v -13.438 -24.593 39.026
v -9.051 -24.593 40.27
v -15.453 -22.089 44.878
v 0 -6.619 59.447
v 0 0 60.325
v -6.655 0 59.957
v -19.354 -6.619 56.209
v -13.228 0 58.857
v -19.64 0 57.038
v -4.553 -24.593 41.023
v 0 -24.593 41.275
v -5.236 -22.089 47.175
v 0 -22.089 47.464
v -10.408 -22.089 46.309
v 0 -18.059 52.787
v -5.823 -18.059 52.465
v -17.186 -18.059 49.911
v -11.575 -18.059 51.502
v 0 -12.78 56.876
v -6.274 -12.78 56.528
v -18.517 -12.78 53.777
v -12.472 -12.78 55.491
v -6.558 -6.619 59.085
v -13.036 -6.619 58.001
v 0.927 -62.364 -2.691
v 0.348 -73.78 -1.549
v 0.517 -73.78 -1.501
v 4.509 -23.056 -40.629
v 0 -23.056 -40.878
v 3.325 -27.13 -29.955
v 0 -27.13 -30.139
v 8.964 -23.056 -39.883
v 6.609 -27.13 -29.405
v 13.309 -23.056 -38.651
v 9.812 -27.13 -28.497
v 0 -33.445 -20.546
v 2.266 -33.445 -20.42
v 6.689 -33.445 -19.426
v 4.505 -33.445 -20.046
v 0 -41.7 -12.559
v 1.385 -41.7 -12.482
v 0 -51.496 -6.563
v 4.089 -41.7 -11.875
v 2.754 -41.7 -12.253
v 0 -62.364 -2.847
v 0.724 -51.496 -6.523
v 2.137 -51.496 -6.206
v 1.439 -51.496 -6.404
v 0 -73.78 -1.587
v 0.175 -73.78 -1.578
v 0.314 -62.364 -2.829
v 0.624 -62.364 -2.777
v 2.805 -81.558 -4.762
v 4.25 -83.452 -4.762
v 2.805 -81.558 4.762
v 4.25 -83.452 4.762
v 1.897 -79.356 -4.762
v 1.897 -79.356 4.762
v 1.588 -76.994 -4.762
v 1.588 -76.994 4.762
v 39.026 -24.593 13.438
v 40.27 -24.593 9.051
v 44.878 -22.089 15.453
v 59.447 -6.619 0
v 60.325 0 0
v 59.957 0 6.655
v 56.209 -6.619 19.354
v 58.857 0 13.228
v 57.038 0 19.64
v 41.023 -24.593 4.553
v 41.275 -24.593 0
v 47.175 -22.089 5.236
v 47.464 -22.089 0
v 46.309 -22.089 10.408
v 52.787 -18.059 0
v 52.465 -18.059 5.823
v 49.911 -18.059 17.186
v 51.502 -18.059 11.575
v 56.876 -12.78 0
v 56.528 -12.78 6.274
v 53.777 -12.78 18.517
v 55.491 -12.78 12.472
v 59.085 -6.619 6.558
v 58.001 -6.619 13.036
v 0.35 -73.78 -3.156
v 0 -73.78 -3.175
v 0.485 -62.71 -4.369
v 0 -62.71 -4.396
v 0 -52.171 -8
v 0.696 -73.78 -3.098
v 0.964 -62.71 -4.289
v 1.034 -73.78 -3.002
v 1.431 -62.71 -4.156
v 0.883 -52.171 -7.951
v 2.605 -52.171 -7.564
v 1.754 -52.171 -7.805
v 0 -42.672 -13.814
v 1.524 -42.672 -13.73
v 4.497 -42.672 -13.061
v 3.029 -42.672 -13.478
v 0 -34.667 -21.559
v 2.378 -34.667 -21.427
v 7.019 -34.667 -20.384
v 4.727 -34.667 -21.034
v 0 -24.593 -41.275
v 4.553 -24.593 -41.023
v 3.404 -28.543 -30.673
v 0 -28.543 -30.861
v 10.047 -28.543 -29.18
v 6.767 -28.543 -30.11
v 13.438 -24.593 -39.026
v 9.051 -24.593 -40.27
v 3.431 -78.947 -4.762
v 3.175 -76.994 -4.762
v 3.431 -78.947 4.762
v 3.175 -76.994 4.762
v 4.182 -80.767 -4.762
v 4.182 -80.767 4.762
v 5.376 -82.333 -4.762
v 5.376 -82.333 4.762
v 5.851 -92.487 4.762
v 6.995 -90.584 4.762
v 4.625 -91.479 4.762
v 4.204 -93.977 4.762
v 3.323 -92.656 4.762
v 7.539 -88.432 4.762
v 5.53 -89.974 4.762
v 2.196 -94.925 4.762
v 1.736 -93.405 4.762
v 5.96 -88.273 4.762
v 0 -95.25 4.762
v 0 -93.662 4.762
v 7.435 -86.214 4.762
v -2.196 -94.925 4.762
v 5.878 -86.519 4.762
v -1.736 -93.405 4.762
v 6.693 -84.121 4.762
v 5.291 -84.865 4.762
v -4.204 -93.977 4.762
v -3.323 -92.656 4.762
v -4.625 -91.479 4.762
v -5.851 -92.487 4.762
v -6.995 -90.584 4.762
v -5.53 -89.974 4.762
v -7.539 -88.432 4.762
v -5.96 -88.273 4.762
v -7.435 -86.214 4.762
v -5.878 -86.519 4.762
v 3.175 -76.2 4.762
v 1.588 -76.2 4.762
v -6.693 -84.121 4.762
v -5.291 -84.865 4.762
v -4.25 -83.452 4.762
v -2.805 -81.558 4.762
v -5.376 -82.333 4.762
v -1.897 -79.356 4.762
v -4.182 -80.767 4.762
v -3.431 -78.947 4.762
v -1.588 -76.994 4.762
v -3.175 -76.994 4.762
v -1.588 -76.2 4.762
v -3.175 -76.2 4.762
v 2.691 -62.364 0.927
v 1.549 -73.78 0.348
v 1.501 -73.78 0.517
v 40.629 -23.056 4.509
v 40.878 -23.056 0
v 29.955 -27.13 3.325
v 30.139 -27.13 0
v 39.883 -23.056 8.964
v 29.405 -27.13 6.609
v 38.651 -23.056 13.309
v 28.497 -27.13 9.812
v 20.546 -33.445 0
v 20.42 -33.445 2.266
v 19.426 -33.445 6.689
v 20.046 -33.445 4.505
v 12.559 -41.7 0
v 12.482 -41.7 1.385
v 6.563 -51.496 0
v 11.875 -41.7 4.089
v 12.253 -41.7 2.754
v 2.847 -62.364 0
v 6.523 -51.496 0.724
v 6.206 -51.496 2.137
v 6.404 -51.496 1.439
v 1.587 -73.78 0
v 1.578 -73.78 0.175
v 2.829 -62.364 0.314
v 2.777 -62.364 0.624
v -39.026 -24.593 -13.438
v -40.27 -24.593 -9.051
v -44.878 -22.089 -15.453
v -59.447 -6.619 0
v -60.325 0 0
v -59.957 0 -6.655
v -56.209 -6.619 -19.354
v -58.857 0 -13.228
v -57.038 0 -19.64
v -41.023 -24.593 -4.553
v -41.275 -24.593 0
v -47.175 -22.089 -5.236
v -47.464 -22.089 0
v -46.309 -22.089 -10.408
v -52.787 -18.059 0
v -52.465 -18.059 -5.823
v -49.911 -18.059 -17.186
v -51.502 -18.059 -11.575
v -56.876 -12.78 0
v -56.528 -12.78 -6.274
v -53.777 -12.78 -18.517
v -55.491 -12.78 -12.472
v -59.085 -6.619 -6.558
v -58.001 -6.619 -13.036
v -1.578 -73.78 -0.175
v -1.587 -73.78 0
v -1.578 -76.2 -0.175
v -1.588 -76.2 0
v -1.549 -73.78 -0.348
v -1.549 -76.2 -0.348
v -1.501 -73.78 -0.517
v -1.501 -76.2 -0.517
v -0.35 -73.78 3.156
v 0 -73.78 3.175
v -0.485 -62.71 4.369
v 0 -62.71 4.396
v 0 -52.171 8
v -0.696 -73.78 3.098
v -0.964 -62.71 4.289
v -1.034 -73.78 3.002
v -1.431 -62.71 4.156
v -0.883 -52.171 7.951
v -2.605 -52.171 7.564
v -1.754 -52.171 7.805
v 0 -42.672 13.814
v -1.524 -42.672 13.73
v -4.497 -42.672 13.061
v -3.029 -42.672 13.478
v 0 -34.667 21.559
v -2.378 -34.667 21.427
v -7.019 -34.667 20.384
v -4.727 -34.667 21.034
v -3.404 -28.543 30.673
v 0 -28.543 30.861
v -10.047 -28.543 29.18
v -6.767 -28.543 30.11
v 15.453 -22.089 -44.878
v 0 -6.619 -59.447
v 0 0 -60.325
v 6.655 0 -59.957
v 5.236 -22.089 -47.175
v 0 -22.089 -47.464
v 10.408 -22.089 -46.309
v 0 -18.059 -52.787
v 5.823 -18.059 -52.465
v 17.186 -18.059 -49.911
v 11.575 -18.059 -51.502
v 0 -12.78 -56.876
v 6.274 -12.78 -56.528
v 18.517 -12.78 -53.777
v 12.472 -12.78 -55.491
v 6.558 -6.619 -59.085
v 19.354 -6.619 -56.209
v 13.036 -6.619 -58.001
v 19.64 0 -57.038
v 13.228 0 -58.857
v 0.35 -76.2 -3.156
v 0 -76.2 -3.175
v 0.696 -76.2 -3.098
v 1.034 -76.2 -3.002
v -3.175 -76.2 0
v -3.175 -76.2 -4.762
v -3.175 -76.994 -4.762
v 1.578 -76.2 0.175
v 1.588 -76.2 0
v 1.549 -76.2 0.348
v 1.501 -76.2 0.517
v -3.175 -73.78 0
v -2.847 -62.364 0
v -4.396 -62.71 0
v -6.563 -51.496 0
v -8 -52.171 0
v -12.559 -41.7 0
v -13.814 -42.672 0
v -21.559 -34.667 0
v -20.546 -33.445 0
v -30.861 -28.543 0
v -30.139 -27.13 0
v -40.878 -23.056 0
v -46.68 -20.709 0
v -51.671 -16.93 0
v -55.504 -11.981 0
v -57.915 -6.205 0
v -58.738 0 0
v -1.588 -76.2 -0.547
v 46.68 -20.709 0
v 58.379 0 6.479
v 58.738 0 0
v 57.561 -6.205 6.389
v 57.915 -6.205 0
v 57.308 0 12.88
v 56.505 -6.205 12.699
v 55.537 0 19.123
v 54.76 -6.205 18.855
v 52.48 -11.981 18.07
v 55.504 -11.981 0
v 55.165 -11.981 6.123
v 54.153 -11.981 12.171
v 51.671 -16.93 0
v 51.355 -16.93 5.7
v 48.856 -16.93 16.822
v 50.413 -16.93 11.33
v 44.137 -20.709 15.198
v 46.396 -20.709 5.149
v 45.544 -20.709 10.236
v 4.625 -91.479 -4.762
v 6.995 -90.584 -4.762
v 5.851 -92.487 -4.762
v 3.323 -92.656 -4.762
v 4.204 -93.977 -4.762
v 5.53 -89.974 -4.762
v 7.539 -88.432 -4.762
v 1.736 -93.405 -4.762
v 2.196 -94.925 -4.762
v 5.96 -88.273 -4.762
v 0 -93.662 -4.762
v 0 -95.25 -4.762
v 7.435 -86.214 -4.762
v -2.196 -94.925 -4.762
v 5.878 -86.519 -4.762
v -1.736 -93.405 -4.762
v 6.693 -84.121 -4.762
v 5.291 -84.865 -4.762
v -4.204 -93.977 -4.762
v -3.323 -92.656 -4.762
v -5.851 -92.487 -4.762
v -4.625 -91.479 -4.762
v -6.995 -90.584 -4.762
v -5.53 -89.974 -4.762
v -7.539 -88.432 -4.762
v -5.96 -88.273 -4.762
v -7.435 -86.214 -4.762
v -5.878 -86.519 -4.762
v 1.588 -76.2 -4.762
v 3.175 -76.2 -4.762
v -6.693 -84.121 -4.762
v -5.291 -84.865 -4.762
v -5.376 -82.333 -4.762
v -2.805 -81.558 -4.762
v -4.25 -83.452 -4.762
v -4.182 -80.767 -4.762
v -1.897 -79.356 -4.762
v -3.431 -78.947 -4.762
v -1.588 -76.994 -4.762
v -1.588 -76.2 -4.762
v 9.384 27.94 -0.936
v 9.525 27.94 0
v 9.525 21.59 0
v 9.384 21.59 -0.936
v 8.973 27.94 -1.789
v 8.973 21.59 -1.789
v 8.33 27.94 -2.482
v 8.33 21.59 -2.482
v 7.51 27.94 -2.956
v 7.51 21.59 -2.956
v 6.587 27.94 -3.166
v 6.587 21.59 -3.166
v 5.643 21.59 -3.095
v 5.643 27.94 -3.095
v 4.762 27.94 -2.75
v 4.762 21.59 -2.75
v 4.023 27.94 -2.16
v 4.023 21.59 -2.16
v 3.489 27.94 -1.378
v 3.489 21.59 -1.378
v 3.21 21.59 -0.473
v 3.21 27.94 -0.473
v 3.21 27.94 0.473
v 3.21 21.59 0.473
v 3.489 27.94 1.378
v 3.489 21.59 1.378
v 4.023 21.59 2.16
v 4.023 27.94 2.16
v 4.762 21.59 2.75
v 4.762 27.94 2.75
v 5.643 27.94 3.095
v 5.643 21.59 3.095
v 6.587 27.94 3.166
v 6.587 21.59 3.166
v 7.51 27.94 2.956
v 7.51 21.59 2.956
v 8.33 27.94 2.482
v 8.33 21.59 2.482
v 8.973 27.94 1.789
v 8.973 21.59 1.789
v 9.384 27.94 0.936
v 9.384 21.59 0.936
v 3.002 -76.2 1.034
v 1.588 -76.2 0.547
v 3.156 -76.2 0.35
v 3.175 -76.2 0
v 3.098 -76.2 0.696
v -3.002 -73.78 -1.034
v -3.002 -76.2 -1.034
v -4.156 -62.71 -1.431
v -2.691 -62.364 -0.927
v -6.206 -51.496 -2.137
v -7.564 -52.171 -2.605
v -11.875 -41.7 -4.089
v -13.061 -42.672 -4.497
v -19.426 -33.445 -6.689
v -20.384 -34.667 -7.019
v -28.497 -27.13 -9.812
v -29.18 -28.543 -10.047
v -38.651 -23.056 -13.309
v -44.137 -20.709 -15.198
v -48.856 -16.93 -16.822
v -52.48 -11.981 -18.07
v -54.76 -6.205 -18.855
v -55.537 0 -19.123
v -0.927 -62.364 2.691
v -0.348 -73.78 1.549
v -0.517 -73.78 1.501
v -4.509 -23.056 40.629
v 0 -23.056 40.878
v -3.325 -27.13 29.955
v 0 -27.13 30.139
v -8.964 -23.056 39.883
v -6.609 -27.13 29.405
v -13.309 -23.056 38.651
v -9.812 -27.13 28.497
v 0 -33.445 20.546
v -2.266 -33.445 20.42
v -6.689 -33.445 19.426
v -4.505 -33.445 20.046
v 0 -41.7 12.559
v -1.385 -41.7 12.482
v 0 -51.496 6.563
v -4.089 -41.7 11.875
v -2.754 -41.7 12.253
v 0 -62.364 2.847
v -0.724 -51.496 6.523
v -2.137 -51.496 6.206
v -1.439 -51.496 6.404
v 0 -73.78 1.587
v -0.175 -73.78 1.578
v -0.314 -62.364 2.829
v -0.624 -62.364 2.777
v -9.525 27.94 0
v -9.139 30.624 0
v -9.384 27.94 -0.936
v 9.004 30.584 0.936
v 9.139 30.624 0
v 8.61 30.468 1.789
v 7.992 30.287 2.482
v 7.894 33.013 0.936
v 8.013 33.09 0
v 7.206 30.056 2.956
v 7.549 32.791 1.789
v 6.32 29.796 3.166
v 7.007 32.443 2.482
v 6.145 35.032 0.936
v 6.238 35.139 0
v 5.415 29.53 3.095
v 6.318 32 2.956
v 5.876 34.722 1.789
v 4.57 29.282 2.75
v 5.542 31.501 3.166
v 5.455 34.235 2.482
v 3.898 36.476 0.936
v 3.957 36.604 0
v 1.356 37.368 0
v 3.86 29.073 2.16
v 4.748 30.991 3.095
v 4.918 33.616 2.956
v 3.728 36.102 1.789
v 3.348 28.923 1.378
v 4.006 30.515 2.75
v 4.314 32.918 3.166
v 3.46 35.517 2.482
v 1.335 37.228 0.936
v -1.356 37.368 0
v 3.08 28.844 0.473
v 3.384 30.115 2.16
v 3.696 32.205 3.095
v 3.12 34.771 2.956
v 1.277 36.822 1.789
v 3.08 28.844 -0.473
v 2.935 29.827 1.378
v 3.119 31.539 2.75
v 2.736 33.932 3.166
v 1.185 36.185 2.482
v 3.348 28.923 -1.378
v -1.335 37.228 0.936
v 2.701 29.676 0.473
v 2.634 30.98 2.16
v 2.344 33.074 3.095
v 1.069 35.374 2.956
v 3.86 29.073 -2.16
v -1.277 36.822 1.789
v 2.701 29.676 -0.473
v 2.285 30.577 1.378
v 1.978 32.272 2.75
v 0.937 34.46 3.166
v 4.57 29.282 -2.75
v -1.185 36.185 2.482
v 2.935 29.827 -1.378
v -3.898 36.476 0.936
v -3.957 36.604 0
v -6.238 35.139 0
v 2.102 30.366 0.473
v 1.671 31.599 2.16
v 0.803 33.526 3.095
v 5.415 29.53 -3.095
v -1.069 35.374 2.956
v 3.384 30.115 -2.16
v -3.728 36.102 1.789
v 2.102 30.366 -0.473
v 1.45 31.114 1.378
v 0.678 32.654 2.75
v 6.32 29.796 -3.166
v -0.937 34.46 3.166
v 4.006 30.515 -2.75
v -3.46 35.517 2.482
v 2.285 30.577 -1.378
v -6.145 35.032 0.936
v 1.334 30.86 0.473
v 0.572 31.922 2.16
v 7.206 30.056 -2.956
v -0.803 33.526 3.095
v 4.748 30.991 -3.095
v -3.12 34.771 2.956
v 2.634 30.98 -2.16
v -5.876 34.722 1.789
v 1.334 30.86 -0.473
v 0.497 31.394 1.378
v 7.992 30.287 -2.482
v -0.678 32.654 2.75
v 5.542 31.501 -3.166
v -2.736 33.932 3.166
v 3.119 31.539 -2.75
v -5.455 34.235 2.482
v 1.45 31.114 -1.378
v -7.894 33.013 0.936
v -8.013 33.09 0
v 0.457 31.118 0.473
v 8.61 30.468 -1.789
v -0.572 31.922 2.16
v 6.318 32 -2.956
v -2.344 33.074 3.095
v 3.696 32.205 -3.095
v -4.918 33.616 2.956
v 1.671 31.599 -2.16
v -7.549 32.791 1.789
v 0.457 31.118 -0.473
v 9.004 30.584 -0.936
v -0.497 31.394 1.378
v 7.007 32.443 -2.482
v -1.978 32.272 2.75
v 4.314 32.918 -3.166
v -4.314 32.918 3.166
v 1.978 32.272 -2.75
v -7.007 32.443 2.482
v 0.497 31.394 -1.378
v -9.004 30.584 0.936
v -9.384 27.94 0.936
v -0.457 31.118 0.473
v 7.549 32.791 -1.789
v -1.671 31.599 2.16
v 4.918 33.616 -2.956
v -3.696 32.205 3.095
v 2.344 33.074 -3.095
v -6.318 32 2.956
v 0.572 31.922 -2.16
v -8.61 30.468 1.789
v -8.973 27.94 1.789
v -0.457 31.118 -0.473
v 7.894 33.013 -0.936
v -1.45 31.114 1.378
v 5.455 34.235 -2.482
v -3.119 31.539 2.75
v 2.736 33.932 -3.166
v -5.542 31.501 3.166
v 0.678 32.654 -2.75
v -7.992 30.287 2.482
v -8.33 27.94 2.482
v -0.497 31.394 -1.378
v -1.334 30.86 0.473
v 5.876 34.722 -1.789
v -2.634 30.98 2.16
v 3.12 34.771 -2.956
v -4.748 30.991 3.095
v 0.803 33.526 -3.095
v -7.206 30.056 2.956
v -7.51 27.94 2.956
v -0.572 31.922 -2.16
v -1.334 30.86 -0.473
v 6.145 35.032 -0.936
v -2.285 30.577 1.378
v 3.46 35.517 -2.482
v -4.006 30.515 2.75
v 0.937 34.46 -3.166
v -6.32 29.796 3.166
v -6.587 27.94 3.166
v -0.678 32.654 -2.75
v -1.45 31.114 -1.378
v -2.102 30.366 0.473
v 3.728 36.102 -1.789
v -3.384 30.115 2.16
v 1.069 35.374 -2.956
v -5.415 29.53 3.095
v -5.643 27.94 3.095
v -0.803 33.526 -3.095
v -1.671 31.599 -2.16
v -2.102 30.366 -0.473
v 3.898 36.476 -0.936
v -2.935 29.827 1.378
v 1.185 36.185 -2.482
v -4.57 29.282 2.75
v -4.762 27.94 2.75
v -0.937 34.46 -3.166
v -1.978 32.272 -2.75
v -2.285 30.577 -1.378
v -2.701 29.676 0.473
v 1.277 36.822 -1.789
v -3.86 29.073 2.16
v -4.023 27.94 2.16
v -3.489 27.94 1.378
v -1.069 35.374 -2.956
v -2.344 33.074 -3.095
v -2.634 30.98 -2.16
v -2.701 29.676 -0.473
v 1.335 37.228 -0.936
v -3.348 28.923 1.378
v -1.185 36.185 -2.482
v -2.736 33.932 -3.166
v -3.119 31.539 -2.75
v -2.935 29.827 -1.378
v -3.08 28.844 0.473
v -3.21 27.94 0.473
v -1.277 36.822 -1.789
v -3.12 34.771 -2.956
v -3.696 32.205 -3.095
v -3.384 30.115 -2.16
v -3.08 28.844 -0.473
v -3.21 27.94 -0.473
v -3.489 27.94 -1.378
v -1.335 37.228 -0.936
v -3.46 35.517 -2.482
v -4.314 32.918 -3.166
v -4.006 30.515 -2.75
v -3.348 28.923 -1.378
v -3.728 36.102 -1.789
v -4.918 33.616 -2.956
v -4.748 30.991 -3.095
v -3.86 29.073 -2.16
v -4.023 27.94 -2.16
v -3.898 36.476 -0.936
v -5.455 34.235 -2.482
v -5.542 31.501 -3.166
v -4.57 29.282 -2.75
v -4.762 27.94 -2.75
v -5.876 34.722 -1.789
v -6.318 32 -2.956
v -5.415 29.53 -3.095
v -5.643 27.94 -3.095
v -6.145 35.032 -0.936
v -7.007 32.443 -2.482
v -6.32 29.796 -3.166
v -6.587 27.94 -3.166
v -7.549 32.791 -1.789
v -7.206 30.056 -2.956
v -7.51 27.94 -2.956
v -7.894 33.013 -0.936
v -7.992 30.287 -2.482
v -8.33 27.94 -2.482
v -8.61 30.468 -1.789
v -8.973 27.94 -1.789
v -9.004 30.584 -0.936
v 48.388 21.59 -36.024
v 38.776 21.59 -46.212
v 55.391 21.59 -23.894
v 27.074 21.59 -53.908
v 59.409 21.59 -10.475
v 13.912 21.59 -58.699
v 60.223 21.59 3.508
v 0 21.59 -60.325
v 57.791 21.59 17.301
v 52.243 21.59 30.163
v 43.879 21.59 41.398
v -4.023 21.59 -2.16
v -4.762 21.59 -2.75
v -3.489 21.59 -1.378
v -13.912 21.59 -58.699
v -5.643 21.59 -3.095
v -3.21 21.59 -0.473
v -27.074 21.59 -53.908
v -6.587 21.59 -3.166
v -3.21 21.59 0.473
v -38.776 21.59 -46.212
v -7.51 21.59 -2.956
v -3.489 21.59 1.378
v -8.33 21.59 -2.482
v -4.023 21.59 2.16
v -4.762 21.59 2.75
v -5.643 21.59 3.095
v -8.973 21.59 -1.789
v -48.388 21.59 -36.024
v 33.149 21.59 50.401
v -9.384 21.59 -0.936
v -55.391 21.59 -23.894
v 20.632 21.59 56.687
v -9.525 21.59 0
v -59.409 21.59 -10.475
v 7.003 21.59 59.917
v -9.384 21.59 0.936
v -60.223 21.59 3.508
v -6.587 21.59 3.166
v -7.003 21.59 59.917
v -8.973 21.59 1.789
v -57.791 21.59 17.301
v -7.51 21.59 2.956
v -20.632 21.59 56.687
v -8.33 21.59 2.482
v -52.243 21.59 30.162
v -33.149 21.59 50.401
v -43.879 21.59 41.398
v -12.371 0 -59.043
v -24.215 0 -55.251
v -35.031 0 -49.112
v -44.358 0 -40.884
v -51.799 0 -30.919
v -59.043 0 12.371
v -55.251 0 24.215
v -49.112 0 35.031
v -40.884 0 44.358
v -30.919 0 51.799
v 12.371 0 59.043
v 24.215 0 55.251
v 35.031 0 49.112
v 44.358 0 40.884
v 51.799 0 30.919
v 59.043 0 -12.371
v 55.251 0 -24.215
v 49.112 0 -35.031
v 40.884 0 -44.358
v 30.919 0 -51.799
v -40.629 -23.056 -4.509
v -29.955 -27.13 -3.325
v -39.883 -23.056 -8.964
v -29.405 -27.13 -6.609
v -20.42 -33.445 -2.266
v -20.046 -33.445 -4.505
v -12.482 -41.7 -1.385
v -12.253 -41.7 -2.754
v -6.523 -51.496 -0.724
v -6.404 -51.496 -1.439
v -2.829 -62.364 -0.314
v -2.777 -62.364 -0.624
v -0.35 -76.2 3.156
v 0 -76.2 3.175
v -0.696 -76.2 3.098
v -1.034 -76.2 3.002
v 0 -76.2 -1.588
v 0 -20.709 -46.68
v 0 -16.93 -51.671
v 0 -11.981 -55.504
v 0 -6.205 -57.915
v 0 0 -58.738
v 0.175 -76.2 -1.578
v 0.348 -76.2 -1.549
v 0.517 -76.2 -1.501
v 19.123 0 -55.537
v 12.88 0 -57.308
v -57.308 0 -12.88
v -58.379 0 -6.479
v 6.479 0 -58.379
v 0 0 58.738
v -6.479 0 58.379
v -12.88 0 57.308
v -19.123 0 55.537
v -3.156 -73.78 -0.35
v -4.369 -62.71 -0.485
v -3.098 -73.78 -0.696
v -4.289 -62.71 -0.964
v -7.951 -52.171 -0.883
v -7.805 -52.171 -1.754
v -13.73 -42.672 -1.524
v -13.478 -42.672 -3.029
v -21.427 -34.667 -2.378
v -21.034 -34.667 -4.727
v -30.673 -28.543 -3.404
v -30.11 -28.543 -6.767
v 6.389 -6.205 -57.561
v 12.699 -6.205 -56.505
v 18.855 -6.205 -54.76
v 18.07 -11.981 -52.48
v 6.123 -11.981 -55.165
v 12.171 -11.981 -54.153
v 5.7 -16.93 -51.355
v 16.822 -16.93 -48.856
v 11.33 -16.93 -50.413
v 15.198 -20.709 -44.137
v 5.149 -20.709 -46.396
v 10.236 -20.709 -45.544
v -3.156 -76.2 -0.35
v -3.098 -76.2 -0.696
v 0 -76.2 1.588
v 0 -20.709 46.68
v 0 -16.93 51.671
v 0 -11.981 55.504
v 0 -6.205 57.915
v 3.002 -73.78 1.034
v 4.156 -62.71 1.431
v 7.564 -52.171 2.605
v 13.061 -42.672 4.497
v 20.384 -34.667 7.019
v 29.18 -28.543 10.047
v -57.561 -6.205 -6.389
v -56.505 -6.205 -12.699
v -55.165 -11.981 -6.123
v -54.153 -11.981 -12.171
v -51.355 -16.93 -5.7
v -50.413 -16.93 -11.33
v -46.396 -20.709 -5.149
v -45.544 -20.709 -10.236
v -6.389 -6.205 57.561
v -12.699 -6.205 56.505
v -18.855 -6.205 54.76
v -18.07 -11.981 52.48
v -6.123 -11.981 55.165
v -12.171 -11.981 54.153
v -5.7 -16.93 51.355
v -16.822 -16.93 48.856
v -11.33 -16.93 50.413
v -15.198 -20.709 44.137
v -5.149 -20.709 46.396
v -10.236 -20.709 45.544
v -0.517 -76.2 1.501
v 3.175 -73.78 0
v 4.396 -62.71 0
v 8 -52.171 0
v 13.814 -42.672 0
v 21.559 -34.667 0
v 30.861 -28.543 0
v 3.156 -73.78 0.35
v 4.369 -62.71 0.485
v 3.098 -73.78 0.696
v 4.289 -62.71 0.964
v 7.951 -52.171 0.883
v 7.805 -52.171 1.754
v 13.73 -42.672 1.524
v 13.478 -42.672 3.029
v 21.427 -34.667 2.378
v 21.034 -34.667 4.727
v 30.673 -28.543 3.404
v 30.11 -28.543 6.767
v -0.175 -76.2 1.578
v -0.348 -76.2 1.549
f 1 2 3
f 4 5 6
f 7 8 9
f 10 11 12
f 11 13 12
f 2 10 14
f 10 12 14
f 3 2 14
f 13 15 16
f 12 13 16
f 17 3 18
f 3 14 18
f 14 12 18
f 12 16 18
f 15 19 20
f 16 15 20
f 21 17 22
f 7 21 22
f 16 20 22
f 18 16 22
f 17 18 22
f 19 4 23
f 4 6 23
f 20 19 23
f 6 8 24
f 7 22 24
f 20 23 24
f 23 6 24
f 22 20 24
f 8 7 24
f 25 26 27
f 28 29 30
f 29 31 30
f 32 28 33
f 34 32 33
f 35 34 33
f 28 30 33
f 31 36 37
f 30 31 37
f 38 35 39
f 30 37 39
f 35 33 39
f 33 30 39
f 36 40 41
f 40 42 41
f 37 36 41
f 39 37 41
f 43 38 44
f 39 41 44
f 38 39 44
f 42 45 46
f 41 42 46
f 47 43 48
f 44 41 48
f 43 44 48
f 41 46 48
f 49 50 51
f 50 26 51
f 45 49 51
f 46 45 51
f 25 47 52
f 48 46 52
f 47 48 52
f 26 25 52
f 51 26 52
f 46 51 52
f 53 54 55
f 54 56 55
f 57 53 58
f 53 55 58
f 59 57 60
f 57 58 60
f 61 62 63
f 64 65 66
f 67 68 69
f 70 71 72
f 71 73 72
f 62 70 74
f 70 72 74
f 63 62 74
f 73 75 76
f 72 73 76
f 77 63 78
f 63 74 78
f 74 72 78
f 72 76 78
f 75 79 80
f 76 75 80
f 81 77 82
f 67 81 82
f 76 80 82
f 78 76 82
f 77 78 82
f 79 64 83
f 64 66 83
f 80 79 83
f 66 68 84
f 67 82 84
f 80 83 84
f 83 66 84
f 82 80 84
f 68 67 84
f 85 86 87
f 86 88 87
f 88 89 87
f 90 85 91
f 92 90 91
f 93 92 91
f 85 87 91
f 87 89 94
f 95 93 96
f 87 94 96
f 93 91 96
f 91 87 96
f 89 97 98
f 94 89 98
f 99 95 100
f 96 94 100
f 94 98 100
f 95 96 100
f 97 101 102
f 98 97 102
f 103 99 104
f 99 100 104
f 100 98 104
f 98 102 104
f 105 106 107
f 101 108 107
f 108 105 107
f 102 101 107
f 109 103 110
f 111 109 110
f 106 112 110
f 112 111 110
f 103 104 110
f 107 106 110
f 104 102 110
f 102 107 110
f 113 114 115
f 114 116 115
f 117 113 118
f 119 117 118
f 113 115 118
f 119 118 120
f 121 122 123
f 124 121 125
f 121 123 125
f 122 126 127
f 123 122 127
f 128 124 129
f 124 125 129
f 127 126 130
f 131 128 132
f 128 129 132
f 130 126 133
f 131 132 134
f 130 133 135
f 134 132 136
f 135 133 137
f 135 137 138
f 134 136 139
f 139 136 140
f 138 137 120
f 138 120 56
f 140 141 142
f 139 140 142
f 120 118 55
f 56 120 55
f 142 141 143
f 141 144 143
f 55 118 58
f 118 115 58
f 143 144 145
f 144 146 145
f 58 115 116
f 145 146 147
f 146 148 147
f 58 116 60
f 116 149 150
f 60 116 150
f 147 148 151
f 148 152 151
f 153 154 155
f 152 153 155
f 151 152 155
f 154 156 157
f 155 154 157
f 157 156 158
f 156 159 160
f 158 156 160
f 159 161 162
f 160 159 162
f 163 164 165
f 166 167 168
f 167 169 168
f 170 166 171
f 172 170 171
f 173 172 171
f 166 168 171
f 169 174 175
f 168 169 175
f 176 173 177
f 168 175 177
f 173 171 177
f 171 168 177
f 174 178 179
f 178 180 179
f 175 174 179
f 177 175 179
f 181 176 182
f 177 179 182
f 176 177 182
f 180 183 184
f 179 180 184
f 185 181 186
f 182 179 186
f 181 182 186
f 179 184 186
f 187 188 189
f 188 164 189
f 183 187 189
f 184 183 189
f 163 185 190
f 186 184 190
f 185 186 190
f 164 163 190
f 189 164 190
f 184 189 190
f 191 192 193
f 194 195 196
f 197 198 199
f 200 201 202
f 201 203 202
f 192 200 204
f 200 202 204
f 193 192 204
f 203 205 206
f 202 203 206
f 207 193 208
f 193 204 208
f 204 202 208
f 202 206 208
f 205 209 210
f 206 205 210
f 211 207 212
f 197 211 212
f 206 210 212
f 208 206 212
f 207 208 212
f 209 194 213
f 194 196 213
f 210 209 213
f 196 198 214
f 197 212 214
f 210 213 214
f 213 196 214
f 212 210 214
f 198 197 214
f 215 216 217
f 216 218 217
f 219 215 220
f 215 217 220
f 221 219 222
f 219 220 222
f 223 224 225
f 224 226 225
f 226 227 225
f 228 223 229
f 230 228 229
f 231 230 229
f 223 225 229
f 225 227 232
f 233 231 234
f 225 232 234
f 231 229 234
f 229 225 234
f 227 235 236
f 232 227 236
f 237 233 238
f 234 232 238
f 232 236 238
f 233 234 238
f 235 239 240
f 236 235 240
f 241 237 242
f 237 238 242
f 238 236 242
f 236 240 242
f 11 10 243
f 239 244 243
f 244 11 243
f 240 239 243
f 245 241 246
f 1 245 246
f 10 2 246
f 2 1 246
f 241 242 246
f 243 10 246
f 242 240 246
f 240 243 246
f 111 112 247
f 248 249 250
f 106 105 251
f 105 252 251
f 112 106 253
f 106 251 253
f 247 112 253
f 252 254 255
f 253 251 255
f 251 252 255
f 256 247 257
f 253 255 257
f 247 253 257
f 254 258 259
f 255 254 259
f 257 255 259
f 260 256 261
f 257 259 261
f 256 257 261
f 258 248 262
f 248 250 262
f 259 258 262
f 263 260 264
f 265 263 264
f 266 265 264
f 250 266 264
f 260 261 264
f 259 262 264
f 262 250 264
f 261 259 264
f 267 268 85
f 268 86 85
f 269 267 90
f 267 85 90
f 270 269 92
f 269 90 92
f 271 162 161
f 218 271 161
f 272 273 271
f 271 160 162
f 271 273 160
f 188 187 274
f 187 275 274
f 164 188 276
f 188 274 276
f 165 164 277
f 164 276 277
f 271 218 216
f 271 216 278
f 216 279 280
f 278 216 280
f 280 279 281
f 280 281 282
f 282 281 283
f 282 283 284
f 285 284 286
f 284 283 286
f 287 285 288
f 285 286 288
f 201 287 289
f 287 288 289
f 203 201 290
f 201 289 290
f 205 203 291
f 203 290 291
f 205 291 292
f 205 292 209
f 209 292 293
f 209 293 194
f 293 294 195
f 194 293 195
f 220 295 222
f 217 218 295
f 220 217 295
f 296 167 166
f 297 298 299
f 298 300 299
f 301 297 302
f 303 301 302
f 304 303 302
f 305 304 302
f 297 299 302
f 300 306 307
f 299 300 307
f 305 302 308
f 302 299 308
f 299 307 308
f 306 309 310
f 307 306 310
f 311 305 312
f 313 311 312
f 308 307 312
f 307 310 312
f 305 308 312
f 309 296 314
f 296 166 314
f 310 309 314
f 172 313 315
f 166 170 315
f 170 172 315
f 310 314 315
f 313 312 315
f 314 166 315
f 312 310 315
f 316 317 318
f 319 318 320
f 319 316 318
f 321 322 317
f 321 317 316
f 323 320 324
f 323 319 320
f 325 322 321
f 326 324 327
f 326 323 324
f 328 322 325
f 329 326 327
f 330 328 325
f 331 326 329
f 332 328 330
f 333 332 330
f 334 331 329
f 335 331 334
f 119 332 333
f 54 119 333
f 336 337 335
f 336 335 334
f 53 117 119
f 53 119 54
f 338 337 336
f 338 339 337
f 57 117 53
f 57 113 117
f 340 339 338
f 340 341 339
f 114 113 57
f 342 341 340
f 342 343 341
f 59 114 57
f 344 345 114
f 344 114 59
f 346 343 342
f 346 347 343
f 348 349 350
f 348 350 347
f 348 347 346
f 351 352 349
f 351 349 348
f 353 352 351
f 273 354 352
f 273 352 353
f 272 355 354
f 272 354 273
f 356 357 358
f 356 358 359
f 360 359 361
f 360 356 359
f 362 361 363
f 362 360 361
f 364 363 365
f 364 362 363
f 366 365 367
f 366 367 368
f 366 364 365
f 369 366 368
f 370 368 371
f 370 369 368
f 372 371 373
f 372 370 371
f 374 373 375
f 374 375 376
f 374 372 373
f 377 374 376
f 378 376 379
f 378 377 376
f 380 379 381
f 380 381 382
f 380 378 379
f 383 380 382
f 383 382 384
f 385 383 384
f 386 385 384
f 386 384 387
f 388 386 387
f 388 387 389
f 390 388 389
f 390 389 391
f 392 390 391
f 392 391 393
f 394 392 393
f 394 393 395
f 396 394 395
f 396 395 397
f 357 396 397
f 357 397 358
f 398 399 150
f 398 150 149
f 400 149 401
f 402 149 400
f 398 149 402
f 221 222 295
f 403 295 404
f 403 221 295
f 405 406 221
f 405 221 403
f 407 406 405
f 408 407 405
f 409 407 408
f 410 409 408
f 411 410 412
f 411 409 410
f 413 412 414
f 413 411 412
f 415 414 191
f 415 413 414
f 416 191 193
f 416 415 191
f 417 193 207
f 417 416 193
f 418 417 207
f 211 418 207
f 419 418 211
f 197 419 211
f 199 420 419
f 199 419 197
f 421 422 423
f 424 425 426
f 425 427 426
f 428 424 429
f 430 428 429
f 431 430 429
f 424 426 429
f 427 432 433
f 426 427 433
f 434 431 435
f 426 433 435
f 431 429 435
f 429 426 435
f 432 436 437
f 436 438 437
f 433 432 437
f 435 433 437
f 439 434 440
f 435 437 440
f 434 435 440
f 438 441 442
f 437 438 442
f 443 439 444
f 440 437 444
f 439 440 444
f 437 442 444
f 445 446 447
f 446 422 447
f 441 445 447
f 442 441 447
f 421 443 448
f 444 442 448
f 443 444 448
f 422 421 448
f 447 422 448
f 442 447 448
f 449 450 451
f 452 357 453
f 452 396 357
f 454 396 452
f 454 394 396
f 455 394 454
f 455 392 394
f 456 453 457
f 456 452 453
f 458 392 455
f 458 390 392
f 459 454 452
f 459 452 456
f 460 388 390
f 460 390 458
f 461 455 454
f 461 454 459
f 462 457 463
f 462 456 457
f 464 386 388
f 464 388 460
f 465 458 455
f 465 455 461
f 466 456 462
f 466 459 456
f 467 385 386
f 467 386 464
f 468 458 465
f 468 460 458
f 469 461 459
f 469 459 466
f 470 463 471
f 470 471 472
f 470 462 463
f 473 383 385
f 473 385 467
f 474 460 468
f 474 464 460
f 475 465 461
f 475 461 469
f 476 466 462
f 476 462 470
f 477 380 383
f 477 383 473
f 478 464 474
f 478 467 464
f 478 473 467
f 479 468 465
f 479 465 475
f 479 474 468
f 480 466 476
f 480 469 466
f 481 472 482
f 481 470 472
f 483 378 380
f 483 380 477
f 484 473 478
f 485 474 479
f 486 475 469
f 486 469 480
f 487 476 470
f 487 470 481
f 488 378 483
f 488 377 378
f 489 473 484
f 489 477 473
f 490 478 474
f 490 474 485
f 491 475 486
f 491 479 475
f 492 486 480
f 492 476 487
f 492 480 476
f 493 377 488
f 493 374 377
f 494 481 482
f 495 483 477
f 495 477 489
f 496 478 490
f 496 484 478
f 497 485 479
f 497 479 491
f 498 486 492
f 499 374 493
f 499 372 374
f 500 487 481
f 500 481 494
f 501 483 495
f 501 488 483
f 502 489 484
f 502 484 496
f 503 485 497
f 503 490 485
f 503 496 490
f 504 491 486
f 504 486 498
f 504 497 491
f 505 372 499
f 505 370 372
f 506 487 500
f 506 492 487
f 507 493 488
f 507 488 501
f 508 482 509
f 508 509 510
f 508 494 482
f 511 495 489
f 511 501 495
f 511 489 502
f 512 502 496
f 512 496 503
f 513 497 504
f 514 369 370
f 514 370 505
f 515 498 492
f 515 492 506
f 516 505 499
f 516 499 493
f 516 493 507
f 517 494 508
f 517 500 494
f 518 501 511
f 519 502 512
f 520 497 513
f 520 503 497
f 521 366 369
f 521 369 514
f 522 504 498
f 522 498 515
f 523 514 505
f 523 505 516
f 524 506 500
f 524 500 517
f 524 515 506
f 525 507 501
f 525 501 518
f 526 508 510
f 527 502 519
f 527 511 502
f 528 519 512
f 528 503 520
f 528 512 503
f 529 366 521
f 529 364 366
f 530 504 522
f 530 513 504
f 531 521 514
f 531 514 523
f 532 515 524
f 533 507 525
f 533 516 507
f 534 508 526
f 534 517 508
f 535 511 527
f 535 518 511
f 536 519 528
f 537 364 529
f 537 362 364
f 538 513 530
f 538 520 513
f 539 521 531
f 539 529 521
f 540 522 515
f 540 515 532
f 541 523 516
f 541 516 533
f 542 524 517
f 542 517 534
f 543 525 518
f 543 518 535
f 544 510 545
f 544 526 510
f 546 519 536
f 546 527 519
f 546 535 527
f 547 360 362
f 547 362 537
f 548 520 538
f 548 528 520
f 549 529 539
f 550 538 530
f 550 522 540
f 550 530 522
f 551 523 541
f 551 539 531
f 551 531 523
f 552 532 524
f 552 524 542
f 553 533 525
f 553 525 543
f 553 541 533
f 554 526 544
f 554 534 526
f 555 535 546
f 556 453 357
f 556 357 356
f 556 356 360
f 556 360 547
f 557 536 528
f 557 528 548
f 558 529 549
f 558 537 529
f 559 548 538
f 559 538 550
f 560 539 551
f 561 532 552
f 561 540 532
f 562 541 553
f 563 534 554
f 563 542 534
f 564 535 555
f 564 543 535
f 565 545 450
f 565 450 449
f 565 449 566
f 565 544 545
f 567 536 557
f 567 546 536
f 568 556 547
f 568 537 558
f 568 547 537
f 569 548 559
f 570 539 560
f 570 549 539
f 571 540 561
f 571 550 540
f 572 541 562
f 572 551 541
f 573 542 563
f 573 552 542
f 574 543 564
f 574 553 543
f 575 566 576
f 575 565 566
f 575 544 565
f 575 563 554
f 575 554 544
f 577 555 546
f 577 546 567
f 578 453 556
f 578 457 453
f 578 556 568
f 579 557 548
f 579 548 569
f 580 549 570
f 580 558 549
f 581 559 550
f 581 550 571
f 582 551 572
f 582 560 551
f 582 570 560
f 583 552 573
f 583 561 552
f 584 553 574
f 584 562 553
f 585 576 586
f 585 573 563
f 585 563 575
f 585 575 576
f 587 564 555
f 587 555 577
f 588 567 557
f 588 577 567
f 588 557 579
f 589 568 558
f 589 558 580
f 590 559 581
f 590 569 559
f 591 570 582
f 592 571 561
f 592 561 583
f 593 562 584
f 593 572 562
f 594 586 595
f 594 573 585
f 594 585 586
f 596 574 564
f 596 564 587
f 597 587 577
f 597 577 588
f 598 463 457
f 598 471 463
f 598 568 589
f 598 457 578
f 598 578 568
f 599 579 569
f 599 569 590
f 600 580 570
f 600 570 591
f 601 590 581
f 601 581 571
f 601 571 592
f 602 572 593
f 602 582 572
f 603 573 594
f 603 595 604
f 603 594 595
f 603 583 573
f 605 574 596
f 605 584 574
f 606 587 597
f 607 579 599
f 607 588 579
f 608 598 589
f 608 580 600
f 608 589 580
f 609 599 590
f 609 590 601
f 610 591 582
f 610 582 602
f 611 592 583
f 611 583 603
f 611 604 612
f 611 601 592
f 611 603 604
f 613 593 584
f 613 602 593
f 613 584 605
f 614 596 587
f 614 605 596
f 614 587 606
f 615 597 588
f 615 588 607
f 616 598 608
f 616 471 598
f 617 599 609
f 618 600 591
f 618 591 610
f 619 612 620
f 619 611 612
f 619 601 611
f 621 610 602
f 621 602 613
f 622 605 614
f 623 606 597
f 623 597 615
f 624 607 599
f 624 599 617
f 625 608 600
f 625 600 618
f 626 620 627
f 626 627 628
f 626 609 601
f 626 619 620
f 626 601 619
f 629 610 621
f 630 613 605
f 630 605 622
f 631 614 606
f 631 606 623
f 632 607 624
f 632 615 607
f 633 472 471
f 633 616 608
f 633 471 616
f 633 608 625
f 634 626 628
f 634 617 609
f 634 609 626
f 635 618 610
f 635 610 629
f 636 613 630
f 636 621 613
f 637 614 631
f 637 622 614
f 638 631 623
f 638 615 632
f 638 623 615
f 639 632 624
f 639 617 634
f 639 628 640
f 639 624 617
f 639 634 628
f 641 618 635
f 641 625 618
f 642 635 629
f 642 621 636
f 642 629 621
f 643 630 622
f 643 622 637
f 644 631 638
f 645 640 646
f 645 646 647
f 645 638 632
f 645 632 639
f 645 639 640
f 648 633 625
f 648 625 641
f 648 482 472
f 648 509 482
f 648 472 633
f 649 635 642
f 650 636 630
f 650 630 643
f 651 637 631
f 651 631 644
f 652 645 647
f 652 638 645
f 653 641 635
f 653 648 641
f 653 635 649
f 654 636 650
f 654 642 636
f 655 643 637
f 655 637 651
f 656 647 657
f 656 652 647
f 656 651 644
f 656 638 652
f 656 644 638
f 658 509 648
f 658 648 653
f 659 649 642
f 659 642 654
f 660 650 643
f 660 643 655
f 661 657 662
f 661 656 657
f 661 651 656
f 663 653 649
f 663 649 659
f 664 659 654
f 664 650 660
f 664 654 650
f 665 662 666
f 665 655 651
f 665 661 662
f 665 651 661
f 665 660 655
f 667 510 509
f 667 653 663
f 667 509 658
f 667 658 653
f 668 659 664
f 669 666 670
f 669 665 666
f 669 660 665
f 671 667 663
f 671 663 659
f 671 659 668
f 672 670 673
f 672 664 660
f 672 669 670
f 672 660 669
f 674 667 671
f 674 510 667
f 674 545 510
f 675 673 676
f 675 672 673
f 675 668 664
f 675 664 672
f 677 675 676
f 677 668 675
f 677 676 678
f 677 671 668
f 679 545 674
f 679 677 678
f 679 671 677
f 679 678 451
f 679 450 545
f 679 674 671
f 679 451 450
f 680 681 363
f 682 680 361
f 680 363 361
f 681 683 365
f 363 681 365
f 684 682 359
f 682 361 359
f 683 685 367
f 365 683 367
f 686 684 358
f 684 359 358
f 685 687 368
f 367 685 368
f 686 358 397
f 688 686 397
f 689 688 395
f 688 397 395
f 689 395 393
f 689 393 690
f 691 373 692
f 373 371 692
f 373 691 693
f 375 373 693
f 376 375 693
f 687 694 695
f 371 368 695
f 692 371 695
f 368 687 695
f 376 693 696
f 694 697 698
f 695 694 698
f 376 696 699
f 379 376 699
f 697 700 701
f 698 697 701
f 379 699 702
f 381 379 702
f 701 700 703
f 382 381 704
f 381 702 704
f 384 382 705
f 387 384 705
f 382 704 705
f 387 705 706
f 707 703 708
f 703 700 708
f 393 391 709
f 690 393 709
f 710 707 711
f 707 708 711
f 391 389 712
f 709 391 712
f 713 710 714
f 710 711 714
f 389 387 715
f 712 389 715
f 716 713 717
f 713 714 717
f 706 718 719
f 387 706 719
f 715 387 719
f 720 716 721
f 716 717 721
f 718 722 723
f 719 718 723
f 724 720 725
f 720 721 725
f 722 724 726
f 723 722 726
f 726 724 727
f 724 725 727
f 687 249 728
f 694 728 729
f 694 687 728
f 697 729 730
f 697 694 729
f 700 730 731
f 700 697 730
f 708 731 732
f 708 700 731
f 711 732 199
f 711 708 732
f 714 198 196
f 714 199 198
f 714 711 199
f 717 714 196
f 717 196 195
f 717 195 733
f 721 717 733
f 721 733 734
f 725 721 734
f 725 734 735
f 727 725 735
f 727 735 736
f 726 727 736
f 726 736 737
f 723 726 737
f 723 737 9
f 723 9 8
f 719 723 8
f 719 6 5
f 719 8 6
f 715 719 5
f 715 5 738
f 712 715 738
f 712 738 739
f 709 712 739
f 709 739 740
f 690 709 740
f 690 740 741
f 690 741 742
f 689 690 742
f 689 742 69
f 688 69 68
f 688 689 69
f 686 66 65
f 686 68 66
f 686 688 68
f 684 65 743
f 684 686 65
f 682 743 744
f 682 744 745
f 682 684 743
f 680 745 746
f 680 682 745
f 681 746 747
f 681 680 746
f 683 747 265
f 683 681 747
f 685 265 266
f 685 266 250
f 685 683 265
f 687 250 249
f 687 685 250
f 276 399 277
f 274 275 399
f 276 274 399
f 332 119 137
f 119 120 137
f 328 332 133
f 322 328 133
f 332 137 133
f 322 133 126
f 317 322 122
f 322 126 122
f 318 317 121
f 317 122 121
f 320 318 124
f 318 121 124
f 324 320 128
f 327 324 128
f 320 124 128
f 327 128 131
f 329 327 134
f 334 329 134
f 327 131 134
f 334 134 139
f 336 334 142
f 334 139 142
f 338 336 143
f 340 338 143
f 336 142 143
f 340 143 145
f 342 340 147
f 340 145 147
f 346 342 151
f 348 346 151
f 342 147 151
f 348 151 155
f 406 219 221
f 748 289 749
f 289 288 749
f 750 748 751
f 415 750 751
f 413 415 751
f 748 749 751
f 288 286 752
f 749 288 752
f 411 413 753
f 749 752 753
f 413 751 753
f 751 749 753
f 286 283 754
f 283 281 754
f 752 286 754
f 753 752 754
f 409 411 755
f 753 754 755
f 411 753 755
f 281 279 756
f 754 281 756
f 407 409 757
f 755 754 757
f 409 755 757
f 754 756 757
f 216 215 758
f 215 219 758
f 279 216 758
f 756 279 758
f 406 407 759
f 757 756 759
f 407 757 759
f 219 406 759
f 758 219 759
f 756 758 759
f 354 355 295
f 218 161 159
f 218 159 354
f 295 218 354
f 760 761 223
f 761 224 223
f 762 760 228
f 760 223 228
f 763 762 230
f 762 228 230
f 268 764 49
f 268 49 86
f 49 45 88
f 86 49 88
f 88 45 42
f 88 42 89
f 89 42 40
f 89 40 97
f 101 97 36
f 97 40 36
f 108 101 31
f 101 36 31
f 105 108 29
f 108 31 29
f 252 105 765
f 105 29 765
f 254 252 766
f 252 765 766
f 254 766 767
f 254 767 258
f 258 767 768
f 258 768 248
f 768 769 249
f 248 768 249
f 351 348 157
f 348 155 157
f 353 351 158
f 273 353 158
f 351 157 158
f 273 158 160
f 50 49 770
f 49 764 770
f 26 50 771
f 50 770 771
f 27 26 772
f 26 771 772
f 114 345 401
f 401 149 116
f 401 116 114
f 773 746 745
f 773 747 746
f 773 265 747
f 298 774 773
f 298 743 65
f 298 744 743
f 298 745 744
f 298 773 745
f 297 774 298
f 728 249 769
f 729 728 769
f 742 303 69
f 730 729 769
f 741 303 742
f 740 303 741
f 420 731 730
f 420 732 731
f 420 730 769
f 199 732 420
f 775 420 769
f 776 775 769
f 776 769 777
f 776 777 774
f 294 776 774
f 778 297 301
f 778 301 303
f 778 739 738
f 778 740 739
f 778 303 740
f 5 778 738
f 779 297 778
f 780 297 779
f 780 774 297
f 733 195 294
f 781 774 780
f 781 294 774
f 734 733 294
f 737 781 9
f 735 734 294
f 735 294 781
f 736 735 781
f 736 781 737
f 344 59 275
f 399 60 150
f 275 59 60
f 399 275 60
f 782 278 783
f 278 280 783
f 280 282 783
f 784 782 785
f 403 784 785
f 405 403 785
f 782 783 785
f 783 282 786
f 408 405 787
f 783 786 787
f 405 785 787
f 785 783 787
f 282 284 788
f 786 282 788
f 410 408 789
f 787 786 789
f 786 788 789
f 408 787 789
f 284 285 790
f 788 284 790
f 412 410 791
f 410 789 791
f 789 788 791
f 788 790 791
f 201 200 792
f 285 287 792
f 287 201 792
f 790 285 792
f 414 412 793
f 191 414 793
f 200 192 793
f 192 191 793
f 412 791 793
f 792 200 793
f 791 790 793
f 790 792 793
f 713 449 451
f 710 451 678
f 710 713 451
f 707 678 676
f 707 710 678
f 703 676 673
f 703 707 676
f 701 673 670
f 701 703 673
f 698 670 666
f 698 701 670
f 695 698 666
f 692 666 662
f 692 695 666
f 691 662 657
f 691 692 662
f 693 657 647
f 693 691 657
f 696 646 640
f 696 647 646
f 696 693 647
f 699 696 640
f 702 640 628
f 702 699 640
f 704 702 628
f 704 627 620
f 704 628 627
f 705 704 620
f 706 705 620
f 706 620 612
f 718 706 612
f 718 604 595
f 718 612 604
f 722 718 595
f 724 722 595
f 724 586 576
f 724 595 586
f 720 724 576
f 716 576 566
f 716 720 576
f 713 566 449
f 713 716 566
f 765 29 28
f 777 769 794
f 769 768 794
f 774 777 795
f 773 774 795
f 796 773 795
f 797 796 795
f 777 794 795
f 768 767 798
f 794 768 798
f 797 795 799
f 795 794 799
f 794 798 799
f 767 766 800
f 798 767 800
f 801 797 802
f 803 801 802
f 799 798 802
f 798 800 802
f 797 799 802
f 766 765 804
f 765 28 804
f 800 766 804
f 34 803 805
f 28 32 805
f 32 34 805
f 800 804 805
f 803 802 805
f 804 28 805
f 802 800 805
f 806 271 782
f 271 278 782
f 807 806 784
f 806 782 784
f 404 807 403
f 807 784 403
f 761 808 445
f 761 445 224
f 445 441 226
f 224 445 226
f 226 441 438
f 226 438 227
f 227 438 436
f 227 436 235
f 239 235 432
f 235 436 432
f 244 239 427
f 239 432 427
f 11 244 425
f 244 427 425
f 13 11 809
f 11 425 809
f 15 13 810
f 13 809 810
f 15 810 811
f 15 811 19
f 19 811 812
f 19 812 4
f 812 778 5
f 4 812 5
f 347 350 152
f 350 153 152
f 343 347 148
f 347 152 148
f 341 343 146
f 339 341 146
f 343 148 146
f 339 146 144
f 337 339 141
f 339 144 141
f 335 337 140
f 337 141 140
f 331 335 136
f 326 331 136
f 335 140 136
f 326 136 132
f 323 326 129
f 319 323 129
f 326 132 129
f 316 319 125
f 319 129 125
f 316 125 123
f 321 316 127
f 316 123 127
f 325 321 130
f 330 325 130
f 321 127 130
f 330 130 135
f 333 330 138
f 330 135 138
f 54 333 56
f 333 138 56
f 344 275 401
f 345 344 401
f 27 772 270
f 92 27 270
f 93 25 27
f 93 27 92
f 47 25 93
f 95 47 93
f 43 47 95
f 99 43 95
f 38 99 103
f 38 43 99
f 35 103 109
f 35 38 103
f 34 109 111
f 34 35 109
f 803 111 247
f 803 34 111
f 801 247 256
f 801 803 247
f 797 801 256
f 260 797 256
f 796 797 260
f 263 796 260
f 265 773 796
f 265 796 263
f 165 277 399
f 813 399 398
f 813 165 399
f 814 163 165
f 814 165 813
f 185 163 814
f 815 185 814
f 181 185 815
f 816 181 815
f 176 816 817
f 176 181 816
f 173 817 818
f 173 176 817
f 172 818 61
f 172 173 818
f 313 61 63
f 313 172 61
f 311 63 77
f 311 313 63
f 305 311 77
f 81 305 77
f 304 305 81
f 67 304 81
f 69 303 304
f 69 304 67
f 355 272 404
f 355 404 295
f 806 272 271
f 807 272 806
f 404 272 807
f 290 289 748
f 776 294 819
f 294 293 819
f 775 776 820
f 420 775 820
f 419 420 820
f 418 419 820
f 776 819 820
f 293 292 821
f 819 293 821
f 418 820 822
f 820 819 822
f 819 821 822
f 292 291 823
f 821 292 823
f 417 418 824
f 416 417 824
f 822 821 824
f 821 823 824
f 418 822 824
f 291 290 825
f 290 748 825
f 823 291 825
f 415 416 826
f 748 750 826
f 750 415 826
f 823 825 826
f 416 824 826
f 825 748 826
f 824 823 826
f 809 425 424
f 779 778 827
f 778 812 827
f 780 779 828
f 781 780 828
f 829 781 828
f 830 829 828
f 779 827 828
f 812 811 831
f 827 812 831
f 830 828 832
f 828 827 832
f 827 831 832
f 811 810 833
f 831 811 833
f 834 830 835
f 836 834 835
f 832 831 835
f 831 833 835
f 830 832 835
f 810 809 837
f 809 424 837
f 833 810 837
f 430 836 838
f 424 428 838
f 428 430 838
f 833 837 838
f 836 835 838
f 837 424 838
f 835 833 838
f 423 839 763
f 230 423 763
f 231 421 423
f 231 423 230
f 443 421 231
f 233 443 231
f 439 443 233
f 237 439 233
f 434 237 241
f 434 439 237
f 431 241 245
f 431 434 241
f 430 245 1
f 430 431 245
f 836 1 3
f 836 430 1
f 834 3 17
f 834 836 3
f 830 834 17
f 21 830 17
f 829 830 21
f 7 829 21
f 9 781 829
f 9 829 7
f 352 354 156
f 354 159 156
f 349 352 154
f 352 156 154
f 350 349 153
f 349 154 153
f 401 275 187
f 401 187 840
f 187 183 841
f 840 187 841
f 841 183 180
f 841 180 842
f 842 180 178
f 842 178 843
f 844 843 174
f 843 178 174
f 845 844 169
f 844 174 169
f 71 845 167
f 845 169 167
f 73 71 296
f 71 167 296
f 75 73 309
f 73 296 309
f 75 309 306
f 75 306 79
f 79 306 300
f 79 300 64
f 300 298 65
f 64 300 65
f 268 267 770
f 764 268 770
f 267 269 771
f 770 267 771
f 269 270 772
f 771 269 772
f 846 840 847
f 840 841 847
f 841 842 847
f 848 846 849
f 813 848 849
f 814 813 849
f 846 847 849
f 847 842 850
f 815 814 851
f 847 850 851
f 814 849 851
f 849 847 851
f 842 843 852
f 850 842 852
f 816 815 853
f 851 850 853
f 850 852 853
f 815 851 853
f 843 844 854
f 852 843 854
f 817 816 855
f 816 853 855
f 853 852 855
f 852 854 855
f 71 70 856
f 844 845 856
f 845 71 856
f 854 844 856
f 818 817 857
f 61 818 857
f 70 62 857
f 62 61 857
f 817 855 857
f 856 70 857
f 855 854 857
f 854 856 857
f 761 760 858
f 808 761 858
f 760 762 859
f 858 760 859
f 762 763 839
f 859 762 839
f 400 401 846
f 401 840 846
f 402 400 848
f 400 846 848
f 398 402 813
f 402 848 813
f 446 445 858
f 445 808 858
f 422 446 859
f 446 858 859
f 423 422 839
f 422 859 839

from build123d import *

# Parameters (mm, degrees)
SKETCH1_W           = 60.325
SKETCH1_H           = 21.59
REVOLVE2_ANGLE      = 19
CIRPATTERN2_COUNT   = 4
BOSS_EXTRUDE1_DEPTH = 4.7625
SKETCH8_R           = 3.175


with BuildPart() as part:
    # Sketch1 → Revolve1 (revolve)
    with BuildSketch(Plane.XY, mode=Mode.PRIVATE) as revolve1_sk:
        with Locations((30.1625, 10.795)):
            Rectangle(SKETCH1_W, SKETCH1_H)
    revolve(revolve1_sk.sketch.rotate(Axis((0, 0, 0), (0, 1, 0)), 90), axis=Axis((0, 0, 0), (0, 1, 0)))

    # Sketch4 → Revolve2 (revolve)
    with BuildSketch(Plane.XY):
        with BuildLine():
            Line((60.325, 0), (60.325, 6.35))
            Line((60.325, 6.35), (58.7375, 6.35))
            Line((58.7375, 6.35), (58.7375, 0))
            ThreePointArc((58.7375, 0), (53.750434196, -14.582118625), (40.878125, -23.056353983))
            ThreePointArc((40.878125, -23.056353983), (12.559044769, -41.69967177), (1.5875, -73.780332745))
            Line((1.5875, -73.780332745), (1.5875, -76.2))
            Line((1.5875, -76.2), (3.175, -76.2))
            Line((3.175, -76.2), (3.175, -73.780332745))
            ThreePointArc((3.175, -73.780332745), (13.814073716, -42.671813012), (41.275, -24.593444248))
            ThreePointArc((41.275, -24.593444248), (55.005463142, -15.554259867), (60.325, 0))
        make_face()
    revolve2 = revolve(axis=Axis((0, 0, 0), (0, -1, 0)), revolution_arc=REVOLVE2_ANGLE)

    # CirPattern2: Revolve2 ×4 about axis
    cirpattern2_axis = Axis((0, 0, 0), (0, 1, 0))
    for i in range(1, CIRPATTERN2_COUNT):
        add(revolve2.rotate(cirpattern2_axis, i * 360 / CIRPATTERN2_COUNT))

    # Sketch6 → Boss-Extrude1 (add, symmetric)
    with BuildSketch(Plane.XY):
        with BuildLine():
            Line((3.175, -76.2), (3.175, -76.99375))
            ThreePointArc((3.175, -76.99375), (3.746845437, -79.881464155), (5.376067541, -82.333307459))
            ThreePointArc((5.376067541, -82.333307459), (0, -95.25), (-5.376067541, -82.333307459))
            ThreePointArc((-5.376067541, -82.333307459), (-3.746845437, -79.881464155), (-3.175, -76.99375))
            Line((-3.175, -76.99375), (-3.175, -76.2))
            Line((-3.175, -76.2), (-1.5875, -76.2))
            Line((-1.5875, -76.2), (-1.5875, -76.99375))
            ThreePointArc((-1.5875, -76.99375), (-2.279153864, -80.486474647), (-4.249717393, -83.45200831))
            ThreePointArc((-4.249717393, -83.45200831), (0, -93.6625), (4.249717393, -83.45200831))
            ThreePointArc((4.249717393, -83.45200831), (2.279153864, -80.486474647), (1.5875, -76.99375))
            Line((1.5875, -76.99375), (1.5875, -76.2))
            Line((1.5875, -76.2), (3.175, -76.2))
        make_face()
    extrude(amount=BOSS_EXTRUDE1_DEPTH, both=True)

    # Sweep1: sweep along a path in Sketch7
    with BuildLine(Plane.XY) as sweep1_path:
        Line((6.35, 21.59), (6.35, 27.94))
        ThreePointArc((6.35, 27.94), (0, 34.29), (-6.35, 27.94))
        Line((-6.35, 27.94), (-6.35, 21.59))
    # Sketch8 → Sweep1 (sweep)
    with BuildSketch(Plane(origin=(0, 21.59, 0), x_dir=(1, 0, 0), z_dir=(0, 1, 0))):
        with Locations((6.35, 0)):
            Circle(SKETCH8_R)
    sweep(path=sweep1_path.line)


solid = part.part
